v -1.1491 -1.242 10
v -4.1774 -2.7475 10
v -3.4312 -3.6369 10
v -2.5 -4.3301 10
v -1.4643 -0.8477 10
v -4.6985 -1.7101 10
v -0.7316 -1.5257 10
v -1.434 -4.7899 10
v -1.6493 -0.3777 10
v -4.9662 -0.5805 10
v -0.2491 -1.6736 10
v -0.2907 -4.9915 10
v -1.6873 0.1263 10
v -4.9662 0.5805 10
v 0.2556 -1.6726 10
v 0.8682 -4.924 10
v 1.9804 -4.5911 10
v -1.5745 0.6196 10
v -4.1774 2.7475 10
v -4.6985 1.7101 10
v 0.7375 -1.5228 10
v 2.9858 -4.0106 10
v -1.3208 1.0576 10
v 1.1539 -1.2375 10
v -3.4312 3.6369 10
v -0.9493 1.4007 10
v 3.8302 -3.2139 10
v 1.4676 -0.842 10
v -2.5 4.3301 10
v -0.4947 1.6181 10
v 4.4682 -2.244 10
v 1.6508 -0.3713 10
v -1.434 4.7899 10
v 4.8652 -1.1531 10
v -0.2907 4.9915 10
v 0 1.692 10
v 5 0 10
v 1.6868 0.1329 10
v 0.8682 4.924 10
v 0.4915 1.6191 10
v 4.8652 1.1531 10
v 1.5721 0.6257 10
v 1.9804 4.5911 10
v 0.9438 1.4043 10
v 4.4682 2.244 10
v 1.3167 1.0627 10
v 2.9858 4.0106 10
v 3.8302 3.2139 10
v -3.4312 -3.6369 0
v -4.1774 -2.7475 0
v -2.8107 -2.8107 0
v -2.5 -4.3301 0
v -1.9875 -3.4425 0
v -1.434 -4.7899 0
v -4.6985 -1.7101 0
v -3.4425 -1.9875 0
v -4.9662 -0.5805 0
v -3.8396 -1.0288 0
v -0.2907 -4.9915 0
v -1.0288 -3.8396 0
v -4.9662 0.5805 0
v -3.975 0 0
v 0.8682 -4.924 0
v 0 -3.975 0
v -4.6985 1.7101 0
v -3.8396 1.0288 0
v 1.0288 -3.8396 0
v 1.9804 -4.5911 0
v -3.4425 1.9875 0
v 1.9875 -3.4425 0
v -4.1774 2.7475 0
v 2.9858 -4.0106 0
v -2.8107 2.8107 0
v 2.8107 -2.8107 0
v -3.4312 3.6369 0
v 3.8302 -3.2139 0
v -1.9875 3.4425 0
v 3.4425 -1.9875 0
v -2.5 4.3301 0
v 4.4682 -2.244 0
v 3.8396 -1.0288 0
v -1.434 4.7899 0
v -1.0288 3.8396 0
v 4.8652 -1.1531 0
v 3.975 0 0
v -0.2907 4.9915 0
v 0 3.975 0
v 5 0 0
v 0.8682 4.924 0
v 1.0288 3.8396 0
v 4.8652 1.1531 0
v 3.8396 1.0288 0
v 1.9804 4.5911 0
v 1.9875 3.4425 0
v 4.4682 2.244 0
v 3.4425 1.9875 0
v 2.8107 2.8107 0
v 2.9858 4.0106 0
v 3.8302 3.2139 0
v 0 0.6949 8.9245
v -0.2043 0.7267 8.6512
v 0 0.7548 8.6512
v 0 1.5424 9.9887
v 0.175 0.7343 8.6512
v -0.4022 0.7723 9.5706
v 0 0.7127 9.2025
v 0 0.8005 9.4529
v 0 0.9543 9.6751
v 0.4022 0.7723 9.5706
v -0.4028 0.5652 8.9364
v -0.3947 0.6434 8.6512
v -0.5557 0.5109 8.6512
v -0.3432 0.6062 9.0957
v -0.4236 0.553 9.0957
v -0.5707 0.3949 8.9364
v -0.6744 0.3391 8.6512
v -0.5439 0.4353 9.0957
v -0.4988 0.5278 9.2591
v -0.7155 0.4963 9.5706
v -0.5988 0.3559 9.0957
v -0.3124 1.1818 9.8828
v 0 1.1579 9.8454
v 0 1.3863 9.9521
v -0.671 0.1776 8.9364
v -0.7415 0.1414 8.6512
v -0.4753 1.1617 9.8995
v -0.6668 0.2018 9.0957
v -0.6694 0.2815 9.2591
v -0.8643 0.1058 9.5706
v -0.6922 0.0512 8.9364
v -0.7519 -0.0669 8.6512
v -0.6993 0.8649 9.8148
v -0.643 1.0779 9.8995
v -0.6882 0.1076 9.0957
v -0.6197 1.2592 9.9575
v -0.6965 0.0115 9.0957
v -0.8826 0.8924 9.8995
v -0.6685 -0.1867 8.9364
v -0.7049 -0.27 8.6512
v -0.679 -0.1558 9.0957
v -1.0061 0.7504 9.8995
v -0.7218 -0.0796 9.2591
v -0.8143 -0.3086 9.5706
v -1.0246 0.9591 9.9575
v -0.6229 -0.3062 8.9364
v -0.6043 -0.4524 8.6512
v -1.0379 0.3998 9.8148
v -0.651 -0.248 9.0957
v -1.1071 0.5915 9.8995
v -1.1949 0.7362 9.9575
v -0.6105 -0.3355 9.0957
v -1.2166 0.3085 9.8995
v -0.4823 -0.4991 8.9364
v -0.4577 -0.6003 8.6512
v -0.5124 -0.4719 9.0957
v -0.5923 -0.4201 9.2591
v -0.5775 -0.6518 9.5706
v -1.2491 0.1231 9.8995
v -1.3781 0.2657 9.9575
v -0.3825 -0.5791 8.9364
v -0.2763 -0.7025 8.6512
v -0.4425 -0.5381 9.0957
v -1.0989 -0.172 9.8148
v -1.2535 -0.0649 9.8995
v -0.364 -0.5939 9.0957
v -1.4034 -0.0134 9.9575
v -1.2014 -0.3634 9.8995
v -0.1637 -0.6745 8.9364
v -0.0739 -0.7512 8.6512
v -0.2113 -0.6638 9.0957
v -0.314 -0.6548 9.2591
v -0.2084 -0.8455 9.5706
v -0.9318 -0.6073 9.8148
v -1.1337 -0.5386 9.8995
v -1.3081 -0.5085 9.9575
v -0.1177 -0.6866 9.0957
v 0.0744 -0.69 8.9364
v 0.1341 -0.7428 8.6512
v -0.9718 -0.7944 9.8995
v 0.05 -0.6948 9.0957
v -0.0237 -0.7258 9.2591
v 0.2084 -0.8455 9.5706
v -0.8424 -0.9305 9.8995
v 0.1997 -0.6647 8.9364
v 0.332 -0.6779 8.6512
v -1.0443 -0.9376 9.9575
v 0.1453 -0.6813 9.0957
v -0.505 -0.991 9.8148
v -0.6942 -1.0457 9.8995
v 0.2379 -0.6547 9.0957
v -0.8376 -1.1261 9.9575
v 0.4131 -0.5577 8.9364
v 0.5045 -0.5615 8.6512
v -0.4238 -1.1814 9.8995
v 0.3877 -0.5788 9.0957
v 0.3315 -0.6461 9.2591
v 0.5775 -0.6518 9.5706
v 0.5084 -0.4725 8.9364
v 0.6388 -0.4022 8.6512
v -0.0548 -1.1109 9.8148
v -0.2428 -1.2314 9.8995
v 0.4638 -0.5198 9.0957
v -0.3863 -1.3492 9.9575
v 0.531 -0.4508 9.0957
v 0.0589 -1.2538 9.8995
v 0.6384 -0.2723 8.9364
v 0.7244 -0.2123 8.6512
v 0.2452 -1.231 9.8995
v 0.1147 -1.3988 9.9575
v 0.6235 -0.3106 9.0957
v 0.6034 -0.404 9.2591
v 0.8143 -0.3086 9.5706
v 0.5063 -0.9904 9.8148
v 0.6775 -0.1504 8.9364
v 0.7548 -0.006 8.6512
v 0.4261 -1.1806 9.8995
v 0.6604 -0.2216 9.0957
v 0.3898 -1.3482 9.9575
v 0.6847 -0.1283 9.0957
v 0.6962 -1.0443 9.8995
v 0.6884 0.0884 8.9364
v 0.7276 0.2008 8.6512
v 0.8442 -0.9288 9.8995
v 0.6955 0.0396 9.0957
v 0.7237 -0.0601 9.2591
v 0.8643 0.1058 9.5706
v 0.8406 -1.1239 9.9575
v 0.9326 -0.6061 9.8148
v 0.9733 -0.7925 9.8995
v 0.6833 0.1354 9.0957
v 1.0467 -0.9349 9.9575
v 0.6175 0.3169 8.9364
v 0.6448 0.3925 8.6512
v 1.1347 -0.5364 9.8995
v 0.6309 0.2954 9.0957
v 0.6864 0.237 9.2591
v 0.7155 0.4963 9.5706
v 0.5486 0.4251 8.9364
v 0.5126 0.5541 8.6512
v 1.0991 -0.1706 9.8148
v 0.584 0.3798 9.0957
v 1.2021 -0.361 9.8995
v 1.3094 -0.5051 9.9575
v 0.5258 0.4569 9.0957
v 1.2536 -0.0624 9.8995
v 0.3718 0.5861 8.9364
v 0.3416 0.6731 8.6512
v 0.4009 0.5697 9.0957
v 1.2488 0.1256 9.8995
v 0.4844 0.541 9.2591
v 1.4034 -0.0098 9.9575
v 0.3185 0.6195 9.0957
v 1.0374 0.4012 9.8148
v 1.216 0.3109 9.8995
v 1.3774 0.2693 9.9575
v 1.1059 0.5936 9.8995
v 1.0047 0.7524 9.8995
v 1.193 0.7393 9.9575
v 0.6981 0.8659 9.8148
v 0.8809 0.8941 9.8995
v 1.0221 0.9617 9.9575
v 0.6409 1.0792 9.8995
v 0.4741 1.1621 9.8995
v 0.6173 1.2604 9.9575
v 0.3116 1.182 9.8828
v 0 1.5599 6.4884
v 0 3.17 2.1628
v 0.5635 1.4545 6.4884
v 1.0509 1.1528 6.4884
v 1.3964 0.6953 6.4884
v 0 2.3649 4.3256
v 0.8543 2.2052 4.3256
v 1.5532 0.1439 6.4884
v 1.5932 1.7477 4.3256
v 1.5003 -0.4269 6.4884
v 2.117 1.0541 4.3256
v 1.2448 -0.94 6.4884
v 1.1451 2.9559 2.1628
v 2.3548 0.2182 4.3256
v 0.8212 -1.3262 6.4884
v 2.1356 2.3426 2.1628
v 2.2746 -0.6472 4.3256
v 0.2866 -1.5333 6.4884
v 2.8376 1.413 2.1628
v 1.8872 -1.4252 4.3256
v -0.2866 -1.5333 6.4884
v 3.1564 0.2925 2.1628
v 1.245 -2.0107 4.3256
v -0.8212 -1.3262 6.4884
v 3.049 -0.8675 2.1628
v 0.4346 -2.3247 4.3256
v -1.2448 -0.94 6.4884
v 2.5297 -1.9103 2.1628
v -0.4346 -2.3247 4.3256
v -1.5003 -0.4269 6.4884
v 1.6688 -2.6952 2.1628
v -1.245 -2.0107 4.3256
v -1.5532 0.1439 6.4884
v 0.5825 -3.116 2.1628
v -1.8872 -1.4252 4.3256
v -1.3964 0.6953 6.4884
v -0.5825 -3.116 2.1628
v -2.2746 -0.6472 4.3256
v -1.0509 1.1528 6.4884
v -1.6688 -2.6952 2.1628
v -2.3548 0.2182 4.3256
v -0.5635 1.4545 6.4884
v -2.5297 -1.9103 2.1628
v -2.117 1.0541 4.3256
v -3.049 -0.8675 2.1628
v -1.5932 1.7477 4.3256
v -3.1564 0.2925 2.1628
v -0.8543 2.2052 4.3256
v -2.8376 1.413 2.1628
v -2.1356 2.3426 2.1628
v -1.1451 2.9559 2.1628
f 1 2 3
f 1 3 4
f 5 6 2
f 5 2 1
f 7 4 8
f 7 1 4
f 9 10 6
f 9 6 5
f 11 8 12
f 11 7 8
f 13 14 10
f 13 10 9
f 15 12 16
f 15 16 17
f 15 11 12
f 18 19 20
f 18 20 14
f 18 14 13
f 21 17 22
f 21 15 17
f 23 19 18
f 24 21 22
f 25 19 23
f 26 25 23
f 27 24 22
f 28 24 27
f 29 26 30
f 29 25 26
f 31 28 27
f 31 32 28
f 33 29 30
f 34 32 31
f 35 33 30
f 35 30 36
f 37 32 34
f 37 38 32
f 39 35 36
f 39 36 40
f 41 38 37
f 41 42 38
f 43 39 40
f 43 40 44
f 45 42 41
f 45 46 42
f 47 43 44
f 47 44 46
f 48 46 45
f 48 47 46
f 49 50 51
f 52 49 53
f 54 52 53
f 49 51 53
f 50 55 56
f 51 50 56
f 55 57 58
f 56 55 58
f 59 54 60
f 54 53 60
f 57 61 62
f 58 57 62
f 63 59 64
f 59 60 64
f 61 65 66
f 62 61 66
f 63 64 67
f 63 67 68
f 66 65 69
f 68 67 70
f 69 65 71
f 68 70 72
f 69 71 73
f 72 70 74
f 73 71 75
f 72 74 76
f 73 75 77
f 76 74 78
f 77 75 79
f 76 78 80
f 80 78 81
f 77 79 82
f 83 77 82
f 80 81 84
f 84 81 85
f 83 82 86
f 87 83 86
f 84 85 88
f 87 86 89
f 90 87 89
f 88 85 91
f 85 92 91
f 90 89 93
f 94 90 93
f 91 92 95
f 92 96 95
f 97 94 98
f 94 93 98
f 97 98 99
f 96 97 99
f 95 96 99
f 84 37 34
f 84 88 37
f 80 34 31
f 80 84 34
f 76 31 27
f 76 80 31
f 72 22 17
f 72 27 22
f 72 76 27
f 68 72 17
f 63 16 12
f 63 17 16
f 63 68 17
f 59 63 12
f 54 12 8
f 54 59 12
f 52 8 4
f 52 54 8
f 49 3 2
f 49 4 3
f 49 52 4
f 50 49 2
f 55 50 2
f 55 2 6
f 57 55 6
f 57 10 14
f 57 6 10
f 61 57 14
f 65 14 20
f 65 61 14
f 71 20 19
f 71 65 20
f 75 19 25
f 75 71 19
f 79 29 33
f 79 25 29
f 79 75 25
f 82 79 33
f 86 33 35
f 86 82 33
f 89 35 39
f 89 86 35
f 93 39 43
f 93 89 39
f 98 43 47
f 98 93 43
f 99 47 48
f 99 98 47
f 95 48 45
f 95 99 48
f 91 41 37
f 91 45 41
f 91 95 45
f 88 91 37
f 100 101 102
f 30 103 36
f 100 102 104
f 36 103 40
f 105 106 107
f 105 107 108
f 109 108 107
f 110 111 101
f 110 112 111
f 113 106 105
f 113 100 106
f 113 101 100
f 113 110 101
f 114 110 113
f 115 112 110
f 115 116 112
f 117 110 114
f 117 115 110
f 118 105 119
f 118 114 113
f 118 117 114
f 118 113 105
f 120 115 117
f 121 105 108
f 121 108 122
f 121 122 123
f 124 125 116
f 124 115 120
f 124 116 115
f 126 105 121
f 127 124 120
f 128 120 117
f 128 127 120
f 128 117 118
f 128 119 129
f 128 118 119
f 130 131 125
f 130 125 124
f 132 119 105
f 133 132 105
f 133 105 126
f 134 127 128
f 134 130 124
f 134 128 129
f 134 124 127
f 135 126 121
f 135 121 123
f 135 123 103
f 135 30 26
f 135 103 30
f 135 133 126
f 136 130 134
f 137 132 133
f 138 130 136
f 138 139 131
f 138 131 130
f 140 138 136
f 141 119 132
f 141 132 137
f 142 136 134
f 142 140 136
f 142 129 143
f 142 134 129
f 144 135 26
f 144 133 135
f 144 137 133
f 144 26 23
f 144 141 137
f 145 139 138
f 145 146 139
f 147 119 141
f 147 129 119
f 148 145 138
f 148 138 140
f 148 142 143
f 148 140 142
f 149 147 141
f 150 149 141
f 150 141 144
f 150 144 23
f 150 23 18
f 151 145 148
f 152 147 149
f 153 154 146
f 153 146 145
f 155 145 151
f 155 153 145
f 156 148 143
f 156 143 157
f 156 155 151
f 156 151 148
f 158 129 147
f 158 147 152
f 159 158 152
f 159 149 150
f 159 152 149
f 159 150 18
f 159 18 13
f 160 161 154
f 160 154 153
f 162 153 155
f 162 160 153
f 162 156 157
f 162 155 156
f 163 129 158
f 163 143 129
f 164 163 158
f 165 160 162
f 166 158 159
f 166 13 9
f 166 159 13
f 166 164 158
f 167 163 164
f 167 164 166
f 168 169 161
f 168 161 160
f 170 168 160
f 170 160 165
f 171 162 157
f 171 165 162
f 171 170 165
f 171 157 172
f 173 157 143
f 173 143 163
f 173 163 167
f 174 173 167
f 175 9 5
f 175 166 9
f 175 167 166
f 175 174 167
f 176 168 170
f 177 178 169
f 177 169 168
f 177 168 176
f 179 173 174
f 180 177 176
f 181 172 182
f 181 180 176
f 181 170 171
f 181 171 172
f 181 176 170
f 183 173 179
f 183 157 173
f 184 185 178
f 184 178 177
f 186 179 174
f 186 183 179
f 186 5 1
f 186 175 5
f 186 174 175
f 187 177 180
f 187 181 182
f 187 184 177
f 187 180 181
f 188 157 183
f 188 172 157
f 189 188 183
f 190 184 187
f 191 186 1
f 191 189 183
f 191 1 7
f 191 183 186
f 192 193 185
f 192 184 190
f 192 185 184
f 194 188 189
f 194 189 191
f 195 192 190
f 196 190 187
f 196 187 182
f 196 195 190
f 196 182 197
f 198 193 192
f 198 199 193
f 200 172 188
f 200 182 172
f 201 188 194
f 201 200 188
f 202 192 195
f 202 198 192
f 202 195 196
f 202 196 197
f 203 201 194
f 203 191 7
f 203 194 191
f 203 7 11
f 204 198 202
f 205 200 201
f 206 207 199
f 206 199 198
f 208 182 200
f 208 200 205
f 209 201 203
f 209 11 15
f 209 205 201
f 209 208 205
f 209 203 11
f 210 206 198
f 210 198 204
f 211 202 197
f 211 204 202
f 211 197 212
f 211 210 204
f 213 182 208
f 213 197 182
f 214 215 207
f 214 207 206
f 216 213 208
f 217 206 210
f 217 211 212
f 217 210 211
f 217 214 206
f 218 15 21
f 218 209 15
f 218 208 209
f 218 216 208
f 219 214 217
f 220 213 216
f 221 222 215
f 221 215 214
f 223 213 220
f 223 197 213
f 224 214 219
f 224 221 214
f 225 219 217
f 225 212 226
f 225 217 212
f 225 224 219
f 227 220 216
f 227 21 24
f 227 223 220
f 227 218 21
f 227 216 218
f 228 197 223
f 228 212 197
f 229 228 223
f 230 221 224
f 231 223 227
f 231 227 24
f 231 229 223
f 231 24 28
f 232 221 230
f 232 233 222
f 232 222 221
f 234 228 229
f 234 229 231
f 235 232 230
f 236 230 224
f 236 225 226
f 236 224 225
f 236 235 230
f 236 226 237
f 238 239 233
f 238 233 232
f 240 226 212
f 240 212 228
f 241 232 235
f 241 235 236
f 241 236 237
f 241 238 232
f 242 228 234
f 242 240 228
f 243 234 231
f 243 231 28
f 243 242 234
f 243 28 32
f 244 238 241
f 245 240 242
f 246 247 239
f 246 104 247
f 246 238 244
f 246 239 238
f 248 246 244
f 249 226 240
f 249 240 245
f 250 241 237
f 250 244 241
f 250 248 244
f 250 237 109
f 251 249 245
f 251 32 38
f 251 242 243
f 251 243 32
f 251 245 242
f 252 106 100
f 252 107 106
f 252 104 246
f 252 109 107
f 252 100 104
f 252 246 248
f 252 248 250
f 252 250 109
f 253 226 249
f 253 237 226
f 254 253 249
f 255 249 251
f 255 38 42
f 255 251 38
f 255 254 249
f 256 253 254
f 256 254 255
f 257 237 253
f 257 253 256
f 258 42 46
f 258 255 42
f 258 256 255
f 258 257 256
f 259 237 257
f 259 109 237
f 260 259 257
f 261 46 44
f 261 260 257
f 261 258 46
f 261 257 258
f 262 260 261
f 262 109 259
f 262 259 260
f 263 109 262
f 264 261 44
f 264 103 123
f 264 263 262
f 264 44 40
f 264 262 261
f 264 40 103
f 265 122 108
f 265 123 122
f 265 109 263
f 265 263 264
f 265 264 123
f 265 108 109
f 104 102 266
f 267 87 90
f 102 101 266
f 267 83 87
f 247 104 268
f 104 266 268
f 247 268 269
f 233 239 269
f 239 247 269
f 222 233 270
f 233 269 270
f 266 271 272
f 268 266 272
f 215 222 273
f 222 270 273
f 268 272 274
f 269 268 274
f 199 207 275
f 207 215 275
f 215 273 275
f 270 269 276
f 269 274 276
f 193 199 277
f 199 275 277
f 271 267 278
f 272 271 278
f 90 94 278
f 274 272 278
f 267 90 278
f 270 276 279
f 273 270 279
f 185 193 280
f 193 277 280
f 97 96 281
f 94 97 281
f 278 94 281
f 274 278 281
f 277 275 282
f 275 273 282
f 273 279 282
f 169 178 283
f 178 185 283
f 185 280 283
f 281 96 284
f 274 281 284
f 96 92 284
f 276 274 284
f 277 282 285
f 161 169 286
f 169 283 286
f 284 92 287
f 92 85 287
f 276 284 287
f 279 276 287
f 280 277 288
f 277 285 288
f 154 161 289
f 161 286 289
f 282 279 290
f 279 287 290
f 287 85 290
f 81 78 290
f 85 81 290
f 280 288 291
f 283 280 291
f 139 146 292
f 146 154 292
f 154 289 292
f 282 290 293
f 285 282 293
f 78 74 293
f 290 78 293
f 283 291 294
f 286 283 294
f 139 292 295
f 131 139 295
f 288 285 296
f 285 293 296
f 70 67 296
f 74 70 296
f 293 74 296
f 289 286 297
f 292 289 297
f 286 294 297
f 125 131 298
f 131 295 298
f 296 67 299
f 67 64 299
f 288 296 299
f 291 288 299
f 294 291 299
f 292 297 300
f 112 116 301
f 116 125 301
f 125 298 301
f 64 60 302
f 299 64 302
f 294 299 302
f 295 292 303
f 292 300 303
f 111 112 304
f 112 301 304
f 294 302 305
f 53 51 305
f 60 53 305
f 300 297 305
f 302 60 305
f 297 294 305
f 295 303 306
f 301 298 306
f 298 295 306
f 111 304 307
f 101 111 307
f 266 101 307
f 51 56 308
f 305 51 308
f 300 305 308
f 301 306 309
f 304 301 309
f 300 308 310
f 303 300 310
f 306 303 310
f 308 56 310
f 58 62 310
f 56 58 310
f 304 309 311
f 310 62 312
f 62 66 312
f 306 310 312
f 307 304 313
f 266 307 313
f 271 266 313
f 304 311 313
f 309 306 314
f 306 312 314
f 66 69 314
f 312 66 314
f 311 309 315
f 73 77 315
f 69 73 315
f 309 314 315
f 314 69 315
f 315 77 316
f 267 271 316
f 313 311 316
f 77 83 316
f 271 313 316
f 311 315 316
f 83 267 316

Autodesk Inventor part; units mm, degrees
ref_plane "YZ Plane" through (0, 0, 0) normal (1, 0, 0) x (0, 1, 0)
ref_plane "XZ Plane" through (0, 0, 0) normal (0, 1, 0) x (-1, 0, 0)
ref_plane "XY Plane" through (0, 0, 0) normal (0, 0, 1) x (1, 0, 0)
sketch "Sketch1" plane through (0, 0, 0) normal (0, 0, 1) x (1, 0, 0)
  circle A0 centre (0, 0) radius 5
  dimension "d0" = 10
extrude "Extrusion1" add sketch "Sketch1" along normal blind 10
sketch "Sketch2" plane through (0, 0, 0) normal (0, 0, -1) x (-1, 0, 0)
  point P0 (0, 0)
hole "Hole1" at (0, 0, 0) direction (0, 0, 1) diameter 1.25 end through all
chamfer "Chamfer1" distance 3.35 distance2 9 1 edges at (0, -0.625, 0) measured on face at (3.4917, -0.424, 0)
fillet "Fillet2" radius 1 2 edges at (0, -0.625, 10) (0, -0.625, 9)
properties part number "CableGuideInsert"
